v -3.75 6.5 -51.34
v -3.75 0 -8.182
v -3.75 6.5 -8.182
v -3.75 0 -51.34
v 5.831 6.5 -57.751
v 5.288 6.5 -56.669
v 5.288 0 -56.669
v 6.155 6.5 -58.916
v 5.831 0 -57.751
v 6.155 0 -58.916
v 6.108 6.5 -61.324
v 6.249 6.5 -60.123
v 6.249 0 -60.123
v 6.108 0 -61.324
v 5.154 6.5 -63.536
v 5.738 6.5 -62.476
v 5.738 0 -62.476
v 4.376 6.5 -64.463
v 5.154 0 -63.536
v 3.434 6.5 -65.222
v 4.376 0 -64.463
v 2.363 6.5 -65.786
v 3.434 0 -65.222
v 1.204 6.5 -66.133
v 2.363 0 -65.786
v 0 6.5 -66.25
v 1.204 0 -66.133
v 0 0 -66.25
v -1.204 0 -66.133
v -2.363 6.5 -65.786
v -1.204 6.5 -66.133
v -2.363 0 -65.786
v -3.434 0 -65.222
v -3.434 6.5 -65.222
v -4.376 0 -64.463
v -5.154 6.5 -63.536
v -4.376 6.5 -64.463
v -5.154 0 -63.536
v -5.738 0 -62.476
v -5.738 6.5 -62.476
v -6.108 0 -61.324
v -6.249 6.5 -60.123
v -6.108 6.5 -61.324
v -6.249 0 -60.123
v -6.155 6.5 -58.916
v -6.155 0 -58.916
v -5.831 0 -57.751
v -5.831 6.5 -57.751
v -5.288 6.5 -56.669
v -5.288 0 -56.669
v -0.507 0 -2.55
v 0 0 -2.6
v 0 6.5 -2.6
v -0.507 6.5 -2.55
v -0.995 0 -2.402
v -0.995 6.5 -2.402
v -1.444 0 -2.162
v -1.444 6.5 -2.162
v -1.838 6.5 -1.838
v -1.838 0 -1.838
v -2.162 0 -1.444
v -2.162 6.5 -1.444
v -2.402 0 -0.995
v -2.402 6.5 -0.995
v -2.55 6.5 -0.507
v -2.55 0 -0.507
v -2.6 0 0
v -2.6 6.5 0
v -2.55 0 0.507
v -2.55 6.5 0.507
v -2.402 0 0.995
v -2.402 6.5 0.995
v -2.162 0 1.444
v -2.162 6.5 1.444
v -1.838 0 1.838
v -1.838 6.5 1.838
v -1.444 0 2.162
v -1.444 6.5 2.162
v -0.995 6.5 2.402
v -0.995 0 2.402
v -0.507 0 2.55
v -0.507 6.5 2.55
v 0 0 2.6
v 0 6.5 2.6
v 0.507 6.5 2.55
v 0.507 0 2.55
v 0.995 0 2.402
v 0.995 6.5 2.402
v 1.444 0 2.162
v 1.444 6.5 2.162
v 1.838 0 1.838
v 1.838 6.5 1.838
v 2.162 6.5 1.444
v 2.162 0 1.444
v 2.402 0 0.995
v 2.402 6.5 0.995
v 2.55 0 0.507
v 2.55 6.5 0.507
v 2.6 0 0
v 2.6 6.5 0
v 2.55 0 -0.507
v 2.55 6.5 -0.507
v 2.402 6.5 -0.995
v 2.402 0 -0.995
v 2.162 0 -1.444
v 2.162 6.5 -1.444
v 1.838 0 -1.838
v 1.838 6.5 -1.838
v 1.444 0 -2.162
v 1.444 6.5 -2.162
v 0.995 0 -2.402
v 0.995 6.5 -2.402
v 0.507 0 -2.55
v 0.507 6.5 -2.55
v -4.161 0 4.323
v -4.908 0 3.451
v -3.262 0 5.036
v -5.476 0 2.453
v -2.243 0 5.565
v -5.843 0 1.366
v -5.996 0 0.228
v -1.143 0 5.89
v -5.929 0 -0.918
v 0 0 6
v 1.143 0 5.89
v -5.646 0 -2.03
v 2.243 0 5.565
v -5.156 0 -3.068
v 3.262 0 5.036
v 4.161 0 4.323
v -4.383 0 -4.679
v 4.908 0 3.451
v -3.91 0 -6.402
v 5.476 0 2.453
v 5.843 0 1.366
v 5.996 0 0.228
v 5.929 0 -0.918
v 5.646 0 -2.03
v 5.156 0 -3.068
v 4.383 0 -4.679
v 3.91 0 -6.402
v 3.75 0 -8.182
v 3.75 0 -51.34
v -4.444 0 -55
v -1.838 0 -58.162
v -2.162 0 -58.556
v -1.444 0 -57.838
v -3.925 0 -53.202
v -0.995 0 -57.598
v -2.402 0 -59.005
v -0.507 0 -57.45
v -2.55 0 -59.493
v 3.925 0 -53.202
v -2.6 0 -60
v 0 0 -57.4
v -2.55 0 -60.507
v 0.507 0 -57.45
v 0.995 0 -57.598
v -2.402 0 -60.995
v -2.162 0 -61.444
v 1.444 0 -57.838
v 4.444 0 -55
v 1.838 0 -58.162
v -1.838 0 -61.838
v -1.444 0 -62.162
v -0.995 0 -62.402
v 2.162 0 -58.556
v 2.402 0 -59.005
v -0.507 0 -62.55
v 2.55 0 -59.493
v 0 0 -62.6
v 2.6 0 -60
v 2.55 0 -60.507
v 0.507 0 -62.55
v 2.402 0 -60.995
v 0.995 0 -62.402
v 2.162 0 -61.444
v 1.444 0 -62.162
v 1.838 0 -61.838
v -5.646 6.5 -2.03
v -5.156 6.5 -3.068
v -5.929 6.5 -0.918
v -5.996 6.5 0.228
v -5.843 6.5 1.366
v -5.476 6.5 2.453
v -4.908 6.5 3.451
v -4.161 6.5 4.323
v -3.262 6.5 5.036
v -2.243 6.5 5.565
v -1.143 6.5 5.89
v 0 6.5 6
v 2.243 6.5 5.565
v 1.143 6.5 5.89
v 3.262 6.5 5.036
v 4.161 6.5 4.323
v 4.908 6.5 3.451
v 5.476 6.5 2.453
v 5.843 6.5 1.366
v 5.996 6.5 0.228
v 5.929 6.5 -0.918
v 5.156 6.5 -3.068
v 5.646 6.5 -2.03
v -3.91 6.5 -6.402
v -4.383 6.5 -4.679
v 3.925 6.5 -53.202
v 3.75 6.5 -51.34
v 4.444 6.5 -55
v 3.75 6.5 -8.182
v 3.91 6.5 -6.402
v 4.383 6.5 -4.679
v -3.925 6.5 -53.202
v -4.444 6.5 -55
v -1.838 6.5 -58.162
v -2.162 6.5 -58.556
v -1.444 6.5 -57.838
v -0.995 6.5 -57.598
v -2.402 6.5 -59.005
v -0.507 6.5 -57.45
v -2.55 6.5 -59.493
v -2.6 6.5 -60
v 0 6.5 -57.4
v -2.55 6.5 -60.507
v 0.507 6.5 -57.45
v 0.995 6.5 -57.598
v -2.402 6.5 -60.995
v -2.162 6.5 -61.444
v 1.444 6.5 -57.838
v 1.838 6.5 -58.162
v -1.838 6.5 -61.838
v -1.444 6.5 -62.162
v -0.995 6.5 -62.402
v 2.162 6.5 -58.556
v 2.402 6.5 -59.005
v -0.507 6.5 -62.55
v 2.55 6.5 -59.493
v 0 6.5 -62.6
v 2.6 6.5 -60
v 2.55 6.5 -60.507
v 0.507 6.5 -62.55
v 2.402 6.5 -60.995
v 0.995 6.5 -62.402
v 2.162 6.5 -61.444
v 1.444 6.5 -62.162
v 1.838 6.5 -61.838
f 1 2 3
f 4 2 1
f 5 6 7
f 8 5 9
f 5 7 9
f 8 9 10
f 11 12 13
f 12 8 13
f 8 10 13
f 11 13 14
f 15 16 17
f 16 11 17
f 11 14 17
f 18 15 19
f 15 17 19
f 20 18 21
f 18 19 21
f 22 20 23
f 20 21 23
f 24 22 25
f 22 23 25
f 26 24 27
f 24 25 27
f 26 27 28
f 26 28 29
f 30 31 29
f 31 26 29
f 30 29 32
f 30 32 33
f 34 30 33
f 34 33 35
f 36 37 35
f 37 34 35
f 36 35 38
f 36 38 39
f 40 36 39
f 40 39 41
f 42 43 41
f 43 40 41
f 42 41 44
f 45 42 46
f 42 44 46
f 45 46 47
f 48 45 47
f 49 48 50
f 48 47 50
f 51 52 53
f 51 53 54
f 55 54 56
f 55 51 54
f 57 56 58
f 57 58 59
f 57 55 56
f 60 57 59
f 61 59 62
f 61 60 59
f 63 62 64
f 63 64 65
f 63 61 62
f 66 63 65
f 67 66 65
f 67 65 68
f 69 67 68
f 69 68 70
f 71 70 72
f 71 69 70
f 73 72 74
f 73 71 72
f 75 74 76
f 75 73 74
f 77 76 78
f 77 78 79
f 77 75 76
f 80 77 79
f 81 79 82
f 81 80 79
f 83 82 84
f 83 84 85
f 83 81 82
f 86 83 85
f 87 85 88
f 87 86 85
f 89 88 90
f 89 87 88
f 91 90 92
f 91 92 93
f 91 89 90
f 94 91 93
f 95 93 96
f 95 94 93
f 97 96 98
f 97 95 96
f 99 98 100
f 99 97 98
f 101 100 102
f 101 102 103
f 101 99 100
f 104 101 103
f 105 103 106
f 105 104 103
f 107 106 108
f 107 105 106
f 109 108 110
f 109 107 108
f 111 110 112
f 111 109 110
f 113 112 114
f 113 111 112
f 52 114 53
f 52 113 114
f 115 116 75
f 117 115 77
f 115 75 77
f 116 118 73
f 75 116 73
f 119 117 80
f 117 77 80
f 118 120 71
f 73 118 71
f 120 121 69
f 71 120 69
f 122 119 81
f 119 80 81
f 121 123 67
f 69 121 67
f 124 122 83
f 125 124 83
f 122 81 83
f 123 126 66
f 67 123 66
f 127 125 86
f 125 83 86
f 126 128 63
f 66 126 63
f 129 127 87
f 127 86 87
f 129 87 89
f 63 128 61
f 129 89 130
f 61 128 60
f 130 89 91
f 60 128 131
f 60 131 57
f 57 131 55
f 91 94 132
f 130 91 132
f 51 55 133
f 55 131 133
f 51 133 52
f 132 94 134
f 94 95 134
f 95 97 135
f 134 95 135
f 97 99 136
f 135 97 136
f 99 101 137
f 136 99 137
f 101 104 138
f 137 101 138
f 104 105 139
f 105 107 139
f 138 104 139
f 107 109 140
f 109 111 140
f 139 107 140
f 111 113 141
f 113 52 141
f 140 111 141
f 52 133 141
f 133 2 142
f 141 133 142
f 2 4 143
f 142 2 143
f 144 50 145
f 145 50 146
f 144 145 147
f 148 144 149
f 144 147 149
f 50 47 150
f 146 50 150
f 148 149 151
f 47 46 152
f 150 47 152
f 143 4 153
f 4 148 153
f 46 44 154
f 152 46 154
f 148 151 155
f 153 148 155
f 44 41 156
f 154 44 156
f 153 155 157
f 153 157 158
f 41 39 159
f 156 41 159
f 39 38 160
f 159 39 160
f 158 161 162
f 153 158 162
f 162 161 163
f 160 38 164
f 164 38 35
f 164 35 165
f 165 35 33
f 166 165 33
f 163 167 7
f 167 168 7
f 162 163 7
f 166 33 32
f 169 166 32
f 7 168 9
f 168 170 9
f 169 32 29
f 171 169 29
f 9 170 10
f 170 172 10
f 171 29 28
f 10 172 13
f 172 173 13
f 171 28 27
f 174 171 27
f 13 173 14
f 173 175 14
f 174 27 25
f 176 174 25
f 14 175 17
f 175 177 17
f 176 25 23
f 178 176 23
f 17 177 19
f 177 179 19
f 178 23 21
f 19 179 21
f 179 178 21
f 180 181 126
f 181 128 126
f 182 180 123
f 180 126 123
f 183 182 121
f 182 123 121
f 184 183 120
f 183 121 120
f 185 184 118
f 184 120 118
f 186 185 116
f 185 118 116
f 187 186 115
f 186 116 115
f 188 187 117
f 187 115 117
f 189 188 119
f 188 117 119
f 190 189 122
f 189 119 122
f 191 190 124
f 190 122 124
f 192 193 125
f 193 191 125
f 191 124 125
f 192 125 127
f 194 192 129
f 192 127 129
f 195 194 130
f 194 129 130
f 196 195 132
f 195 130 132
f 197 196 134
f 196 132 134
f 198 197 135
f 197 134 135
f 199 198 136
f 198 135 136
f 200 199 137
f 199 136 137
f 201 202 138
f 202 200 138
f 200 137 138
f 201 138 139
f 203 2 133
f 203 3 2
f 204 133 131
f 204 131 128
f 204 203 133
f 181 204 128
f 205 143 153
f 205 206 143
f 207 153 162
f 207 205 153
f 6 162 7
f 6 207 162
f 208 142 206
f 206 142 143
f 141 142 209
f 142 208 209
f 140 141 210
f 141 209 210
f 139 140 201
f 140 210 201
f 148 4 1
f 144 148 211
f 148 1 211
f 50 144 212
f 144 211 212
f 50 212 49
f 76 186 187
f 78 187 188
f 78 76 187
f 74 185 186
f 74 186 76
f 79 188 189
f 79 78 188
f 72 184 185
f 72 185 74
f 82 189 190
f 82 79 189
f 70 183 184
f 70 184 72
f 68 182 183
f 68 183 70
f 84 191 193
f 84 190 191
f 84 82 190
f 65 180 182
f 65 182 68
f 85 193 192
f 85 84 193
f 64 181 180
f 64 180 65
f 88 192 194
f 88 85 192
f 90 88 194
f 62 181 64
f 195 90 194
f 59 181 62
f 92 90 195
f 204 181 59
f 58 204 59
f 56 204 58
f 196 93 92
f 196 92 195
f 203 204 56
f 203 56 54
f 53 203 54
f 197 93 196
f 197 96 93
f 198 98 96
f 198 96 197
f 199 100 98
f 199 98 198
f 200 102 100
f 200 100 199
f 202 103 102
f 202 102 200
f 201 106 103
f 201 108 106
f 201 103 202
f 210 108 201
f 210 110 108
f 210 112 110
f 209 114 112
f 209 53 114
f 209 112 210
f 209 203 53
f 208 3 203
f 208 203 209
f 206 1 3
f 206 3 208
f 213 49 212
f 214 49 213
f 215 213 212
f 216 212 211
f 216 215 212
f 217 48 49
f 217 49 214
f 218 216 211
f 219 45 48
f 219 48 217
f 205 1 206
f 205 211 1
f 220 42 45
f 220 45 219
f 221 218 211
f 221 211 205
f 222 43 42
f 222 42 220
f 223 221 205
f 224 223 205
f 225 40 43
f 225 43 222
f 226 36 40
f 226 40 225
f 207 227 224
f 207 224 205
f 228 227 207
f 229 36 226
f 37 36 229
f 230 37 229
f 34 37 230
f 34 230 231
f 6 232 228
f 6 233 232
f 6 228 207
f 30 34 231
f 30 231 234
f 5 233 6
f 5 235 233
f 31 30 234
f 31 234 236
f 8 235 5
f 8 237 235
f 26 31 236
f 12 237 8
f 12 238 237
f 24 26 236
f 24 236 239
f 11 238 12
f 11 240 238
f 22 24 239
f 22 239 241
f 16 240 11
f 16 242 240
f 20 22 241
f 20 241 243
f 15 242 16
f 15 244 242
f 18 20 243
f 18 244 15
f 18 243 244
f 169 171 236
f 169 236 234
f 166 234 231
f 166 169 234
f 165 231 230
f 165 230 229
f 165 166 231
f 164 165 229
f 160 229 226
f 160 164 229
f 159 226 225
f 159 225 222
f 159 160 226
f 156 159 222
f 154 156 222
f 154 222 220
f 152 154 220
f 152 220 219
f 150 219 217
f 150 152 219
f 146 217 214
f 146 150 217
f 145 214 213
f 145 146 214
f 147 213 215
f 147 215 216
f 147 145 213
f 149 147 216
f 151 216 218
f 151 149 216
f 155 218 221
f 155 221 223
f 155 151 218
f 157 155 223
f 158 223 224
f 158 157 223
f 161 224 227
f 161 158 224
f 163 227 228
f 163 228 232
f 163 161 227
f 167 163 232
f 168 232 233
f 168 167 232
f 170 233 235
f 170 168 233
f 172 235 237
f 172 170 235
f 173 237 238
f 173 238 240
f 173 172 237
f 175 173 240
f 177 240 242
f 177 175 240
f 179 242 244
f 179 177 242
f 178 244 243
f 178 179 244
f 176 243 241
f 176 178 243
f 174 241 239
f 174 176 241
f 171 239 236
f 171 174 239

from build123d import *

# Parameters (mm, degrees)
SKETCH1_R           = 6.25
SKETCH1_R_2         = 2.6
SKETCH1_R_3         = 6
SKETCH1_W           = 7.5
SKETCH1_H           = 50.316251501
BOSS_EXTRUDE1_DEPTH = 6.5
FILLET1_R           = 10


with BuildPart() as part:
    # Sketch1 → Boss-Extrude1 (new body)
    # profile 1 of 3: a face of its own
    with BuildSketch(Plane(origin=(0, 0, 0), x_dir=(1, 0, 0), z_dir=(0, 1, 0))):
        with Locations((0, 60)):
            Circle(SKETCH1_R)
        with Locations(Location((0, 60, 0), (0, 0, 90))):
            Circle(SKETCH1_R_2, mode=Mode.SUBTRACT)
    # profile 2 of 3: a face of its own
    with BuildSketch(Plane(origin=(0, 0, 0), x_dir=(1, 0, 0), z_dir=(0, 1, 0))):
        Circle(SKETCH1_R_3)
        with Locations(Location((0, 0, 0), (0, 0, 90))):
            Circle(SKETCH1_R_2, mode=Mode.SUBTRACT)
    # profile 3 of 3: a face of its own
    with BuildSketch(Plane(origin=(0, 0, 0), x_dir=(1, 0, 0), z_dir=(0, 1, 0))):
        with Locations((0, 29.84187425)):
            Rectangle(SKETCH1_W, SKETCH1_H)
    extrude(amount=BOSS_EXTRUDE1_DEPTH)

    # Fillet1
    fillet1_edges = [part.edges().sort_by_distance(p)[0] for p in [
        (-3.75, 3.25, -55),
        (3.75, 3.25, -55),
        (3.75, 3.25, -4.683748499),
        (-3.75, 3.25, -4.683748499),
    ]]
    fillet(fillet1_edges, radius=FILLET1_R)


solid = part.part
